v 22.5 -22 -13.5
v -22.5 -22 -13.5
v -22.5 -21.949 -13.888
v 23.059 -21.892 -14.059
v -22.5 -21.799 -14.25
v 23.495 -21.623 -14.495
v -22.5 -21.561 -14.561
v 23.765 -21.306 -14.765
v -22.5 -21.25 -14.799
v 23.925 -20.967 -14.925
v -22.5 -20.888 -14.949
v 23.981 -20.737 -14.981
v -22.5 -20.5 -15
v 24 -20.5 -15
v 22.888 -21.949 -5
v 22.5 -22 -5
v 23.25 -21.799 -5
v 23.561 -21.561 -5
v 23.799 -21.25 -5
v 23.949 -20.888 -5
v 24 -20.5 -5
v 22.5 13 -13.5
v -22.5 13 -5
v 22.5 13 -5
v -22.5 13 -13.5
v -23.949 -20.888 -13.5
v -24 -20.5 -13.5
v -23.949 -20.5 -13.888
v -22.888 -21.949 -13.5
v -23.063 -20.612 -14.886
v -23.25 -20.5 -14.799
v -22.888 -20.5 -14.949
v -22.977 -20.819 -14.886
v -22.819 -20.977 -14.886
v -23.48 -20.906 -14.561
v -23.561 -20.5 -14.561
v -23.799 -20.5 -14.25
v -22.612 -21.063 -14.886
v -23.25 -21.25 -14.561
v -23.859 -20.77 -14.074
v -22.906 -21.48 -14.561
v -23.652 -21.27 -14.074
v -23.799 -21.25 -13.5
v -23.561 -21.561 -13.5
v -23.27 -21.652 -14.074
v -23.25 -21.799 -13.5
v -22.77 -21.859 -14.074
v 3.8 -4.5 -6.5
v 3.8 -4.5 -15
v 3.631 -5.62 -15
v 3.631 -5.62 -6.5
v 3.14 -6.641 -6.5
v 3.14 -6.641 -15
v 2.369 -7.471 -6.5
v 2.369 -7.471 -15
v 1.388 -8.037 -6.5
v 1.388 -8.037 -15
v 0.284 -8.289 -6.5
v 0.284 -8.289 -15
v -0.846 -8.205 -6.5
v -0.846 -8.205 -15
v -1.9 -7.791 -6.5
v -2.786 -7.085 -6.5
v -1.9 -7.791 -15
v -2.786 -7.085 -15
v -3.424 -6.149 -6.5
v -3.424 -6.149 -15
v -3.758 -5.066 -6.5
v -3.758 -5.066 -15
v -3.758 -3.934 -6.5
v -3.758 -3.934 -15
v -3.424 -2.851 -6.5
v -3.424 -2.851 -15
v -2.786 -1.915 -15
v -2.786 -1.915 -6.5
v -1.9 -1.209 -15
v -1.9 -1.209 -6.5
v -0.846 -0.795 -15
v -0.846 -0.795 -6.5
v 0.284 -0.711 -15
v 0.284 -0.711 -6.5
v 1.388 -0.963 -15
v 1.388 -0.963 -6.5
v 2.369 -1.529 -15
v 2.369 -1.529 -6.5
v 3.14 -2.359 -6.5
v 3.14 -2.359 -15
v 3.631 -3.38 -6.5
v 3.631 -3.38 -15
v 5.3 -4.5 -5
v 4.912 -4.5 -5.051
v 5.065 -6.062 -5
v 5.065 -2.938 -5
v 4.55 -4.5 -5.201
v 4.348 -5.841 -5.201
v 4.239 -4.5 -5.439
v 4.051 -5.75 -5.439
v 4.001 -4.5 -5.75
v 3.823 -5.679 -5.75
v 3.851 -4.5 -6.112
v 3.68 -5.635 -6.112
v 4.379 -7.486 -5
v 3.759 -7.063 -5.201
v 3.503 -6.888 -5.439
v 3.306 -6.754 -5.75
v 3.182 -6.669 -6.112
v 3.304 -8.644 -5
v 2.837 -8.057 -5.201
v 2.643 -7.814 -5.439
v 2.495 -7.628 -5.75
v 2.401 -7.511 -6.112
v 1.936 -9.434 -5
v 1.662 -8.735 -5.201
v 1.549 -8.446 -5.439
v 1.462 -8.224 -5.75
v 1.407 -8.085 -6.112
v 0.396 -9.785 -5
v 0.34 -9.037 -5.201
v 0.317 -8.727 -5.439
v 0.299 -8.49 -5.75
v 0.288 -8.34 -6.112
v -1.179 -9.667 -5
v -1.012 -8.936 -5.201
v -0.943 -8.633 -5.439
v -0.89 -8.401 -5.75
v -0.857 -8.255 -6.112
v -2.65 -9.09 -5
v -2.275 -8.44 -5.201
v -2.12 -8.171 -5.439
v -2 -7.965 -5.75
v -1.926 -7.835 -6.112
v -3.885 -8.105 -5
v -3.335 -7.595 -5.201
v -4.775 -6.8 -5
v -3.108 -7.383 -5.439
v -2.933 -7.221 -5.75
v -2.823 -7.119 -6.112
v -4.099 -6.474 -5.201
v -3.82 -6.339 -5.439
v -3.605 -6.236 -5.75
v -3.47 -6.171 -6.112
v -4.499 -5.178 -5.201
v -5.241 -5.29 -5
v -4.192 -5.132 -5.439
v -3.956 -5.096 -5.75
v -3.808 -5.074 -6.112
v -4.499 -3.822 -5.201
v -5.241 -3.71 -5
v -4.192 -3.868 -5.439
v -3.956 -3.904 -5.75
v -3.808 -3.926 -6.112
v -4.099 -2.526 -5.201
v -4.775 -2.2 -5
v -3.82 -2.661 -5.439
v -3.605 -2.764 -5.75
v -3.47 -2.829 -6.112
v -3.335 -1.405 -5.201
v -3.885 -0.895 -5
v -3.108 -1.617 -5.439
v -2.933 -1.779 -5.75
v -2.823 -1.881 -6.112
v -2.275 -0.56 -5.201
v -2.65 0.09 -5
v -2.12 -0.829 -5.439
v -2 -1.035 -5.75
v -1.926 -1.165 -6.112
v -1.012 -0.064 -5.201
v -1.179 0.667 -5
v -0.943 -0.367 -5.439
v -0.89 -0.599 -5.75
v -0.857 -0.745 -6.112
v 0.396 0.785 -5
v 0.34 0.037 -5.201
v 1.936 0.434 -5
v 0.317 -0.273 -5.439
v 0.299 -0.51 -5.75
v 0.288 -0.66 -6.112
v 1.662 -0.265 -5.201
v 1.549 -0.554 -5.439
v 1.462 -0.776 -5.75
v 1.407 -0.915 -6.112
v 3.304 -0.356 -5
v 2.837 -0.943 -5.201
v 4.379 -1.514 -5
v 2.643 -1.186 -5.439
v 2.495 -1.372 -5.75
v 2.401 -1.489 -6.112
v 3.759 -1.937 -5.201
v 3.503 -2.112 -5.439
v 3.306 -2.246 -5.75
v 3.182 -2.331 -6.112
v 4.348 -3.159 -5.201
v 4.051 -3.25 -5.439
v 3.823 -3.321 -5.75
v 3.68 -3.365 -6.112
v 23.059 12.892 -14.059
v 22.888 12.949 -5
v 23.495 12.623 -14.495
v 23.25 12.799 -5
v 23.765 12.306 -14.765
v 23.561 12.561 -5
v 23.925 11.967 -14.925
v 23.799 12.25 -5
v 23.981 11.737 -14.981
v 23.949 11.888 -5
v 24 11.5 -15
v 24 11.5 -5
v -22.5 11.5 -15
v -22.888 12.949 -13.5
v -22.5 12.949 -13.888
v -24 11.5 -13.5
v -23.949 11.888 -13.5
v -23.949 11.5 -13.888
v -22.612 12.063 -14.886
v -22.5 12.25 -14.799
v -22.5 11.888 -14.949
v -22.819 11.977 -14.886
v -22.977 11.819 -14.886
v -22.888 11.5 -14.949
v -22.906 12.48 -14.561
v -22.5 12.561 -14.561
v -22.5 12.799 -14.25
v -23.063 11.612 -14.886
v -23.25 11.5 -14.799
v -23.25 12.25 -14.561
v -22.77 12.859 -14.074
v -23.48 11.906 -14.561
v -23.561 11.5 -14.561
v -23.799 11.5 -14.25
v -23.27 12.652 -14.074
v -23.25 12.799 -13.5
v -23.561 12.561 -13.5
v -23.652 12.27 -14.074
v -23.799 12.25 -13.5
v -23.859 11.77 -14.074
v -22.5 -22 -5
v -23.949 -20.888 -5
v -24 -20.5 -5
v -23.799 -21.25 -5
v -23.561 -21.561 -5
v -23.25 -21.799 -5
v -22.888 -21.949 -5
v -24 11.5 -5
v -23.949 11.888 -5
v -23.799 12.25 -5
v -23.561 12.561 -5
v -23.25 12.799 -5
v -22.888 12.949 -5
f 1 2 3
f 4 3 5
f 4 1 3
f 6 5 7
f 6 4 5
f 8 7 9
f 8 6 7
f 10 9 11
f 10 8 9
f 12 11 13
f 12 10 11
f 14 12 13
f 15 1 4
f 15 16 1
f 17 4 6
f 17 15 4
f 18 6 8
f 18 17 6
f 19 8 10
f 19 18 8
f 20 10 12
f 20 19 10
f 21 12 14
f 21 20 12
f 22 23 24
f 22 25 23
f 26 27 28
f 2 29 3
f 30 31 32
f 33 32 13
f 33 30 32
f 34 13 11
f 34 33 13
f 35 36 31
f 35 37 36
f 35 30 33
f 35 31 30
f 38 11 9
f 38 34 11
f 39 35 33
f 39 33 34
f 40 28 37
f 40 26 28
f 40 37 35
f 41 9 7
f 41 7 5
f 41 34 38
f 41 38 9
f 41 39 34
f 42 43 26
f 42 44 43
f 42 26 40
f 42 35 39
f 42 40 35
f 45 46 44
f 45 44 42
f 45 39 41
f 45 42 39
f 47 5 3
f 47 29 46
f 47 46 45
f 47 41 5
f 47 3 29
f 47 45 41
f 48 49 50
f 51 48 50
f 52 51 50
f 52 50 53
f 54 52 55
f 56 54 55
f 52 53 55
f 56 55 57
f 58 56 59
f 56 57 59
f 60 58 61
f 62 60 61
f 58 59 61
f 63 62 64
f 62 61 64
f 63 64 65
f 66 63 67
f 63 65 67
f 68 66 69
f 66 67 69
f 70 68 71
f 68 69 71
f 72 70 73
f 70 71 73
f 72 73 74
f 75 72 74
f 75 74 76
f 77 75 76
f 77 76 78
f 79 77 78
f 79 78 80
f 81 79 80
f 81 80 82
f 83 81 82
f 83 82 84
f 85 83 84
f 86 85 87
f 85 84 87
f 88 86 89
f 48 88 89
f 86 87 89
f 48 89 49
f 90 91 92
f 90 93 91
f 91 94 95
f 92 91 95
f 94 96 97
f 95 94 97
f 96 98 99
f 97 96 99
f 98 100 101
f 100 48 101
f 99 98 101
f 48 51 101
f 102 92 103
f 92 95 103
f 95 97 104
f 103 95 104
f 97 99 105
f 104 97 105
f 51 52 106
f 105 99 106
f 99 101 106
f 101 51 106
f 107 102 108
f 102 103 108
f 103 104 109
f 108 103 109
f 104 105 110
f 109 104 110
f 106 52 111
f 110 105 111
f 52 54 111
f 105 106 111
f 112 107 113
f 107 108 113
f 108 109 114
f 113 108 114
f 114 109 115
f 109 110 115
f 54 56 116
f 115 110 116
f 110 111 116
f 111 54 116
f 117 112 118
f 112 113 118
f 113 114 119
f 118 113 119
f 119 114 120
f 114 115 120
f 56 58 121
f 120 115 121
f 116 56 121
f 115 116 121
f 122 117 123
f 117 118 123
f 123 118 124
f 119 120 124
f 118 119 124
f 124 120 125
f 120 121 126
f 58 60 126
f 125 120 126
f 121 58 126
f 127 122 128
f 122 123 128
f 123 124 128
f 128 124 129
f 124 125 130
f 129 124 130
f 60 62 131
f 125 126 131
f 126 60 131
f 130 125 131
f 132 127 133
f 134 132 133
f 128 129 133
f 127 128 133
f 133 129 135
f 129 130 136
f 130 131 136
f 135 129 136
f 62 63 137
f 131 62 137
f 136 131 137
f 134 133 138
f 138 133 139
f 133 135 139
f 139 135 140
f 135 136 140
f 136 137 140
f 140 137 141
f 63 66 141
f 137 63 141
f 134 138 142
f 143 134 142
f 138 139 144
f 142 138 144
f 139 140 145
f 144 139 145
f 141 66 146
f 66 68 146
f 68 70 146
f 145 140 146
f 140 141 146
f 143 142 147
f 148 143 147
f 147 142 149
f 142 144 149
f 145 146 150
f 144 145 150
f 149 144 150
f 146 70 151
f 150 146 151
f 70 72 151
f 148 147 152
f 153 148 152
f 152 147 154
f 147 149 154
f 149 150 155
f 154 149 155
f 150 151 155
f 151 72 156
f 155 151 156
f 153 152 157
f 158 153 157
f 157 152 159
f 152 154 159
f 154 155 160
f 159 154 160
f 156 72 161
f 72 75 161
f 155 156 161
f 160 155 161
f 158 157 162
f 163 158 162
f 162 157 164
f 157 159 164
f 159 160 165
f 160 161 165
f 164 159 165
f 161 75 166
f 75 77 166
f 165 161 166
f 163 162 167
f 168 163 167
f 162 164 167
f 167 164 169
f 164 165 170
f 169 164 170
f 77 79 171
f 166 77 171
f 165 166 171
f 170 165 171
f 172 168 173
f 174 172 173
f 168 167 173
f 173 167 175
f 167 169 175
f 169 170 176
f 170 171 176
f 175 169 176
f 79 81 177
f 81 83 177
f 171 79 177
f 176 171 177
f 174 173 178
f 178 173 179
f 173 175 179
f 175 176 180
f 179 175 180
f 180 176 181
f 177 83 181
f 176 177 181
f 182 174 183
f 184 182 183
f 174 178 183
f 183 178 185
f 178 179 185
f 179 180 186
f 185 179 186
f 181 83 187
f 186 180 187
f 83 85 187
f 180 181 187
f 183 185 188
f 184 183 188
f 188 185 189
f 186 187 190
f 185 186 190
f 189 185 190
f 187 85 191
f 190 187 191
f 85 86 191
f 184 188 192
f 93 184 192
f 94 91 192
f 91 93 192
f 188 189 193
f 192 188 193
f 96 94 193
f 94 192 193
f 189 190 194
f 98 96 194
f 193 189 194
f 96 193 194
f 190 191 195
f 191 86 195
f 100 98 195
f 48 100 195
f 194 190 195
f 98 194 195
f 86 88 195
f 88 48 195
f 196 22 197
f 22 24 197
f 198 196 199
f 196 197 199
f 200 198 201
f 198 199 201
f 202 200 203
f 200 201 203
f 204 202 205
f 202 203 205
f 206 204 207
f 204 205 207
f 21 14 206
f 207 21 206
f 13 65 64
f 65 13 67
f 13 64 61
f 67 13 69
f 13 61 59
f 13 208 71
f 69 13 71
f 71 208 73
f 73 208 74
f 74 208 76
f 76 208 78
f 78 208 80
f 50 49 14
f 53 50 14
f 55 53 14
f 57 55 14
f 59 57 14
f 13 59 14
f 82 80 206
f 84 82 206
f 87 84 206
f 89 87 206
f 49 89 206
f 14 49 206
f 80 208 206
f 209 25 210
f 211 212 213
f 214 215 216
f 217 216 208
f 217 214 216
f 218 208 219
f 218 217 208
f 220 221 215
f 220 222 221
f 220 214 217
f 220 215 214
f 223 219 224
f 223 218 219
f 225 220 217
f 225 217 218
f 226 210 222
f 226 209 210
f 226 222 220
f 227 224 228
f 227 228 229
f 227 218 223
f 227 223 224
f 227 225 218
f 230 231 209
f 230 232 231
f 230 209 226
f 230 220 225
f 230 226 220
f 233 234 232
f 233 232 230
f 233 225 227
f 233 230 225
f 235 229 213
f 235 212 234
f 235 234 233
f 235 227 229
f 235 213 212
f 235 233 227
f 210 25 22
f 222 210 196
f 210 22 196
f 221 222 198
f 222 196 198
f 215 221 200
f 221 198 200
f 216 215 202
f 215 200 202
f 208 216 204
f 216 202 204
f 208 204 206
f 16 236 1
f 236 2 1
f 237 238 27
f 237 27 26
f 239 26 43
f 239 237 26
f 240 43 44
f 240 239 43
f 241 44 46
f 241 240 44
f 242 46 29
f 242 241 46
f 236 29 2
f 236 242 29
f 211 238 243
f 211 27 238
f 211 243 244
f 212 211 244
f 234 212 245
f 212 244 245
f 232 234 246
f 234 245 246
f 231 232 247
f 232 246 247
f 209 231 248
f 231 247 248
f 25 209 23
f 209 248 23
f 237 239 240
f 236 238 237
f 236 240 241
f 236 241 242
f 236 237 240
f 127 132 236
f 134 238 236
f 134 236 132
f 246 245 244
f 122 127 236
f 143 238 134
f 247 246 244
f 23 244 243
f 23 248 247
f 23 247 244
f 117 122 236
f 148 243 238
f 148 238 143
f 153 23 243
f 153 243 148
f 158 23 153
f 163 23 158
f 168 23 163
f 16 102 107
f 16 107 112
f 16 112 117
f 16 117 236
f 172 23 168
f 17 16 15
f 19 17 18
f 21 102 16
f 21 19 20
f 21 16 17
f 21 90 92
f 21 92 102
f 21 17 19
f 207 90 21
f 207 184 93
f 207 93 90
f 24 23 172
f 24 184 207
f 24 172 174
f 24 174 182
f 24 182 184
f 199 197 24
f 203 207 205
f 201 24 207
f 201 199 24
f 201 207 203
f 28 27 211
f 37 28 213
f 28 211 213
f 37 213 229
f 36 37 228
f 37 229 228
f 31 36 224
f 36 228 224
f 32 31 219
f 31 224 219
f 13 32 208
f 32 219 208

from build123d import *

# Parameters (mm, degrees)
BOX006_W        = 48
BOX006_H        = 35
BOX006_DEPTH    = 10
SKETCH007_R     = 3.8
POCKET001_DEPTH = 10
FILLET007_R     = 1.5


with BuildPart() as part:
    # Box006 → Box006 (new body)
    with BuildSketch(Plane(origin=(-24, -22, -15), x_dir=(1, 0, 0), z_dir=(0, 0, 1))):
        with Locations((24, 17.5)):
            Rectangle(BOX006_W, BOX006_H)
    extrude(amount=BOX006_DEPTH)

    # Sketch007 → Pocket001 (cut)
    with BuildSketch(Plane(origin=(-24, -22, -15), x_dir=(1, 0, 0), z_dir=(0, 0, -1))):
        with Locations((24, -17.5)):
            Circle(SKETCH007_R)
    extrude(amount=-POCKET001_DEPTH, mode=Mode.SUBTRACT)

    # Fillet007
    fillet007_edges = [part.edges().sort_by_distance(p)[0] for p in [
        (-24, -22, -10),
        (-24, 13, -10),
        (24, -22, -10),
        (0, 13, -15),
        (-24, -4.5, -15),
        (-3.8, -4.5, -5),
        (0, -22, -15),
        (24, 13, -10),
    ]]
    fillet(fillet007_edges, radius=FILLET007_R)


solid = part.part
